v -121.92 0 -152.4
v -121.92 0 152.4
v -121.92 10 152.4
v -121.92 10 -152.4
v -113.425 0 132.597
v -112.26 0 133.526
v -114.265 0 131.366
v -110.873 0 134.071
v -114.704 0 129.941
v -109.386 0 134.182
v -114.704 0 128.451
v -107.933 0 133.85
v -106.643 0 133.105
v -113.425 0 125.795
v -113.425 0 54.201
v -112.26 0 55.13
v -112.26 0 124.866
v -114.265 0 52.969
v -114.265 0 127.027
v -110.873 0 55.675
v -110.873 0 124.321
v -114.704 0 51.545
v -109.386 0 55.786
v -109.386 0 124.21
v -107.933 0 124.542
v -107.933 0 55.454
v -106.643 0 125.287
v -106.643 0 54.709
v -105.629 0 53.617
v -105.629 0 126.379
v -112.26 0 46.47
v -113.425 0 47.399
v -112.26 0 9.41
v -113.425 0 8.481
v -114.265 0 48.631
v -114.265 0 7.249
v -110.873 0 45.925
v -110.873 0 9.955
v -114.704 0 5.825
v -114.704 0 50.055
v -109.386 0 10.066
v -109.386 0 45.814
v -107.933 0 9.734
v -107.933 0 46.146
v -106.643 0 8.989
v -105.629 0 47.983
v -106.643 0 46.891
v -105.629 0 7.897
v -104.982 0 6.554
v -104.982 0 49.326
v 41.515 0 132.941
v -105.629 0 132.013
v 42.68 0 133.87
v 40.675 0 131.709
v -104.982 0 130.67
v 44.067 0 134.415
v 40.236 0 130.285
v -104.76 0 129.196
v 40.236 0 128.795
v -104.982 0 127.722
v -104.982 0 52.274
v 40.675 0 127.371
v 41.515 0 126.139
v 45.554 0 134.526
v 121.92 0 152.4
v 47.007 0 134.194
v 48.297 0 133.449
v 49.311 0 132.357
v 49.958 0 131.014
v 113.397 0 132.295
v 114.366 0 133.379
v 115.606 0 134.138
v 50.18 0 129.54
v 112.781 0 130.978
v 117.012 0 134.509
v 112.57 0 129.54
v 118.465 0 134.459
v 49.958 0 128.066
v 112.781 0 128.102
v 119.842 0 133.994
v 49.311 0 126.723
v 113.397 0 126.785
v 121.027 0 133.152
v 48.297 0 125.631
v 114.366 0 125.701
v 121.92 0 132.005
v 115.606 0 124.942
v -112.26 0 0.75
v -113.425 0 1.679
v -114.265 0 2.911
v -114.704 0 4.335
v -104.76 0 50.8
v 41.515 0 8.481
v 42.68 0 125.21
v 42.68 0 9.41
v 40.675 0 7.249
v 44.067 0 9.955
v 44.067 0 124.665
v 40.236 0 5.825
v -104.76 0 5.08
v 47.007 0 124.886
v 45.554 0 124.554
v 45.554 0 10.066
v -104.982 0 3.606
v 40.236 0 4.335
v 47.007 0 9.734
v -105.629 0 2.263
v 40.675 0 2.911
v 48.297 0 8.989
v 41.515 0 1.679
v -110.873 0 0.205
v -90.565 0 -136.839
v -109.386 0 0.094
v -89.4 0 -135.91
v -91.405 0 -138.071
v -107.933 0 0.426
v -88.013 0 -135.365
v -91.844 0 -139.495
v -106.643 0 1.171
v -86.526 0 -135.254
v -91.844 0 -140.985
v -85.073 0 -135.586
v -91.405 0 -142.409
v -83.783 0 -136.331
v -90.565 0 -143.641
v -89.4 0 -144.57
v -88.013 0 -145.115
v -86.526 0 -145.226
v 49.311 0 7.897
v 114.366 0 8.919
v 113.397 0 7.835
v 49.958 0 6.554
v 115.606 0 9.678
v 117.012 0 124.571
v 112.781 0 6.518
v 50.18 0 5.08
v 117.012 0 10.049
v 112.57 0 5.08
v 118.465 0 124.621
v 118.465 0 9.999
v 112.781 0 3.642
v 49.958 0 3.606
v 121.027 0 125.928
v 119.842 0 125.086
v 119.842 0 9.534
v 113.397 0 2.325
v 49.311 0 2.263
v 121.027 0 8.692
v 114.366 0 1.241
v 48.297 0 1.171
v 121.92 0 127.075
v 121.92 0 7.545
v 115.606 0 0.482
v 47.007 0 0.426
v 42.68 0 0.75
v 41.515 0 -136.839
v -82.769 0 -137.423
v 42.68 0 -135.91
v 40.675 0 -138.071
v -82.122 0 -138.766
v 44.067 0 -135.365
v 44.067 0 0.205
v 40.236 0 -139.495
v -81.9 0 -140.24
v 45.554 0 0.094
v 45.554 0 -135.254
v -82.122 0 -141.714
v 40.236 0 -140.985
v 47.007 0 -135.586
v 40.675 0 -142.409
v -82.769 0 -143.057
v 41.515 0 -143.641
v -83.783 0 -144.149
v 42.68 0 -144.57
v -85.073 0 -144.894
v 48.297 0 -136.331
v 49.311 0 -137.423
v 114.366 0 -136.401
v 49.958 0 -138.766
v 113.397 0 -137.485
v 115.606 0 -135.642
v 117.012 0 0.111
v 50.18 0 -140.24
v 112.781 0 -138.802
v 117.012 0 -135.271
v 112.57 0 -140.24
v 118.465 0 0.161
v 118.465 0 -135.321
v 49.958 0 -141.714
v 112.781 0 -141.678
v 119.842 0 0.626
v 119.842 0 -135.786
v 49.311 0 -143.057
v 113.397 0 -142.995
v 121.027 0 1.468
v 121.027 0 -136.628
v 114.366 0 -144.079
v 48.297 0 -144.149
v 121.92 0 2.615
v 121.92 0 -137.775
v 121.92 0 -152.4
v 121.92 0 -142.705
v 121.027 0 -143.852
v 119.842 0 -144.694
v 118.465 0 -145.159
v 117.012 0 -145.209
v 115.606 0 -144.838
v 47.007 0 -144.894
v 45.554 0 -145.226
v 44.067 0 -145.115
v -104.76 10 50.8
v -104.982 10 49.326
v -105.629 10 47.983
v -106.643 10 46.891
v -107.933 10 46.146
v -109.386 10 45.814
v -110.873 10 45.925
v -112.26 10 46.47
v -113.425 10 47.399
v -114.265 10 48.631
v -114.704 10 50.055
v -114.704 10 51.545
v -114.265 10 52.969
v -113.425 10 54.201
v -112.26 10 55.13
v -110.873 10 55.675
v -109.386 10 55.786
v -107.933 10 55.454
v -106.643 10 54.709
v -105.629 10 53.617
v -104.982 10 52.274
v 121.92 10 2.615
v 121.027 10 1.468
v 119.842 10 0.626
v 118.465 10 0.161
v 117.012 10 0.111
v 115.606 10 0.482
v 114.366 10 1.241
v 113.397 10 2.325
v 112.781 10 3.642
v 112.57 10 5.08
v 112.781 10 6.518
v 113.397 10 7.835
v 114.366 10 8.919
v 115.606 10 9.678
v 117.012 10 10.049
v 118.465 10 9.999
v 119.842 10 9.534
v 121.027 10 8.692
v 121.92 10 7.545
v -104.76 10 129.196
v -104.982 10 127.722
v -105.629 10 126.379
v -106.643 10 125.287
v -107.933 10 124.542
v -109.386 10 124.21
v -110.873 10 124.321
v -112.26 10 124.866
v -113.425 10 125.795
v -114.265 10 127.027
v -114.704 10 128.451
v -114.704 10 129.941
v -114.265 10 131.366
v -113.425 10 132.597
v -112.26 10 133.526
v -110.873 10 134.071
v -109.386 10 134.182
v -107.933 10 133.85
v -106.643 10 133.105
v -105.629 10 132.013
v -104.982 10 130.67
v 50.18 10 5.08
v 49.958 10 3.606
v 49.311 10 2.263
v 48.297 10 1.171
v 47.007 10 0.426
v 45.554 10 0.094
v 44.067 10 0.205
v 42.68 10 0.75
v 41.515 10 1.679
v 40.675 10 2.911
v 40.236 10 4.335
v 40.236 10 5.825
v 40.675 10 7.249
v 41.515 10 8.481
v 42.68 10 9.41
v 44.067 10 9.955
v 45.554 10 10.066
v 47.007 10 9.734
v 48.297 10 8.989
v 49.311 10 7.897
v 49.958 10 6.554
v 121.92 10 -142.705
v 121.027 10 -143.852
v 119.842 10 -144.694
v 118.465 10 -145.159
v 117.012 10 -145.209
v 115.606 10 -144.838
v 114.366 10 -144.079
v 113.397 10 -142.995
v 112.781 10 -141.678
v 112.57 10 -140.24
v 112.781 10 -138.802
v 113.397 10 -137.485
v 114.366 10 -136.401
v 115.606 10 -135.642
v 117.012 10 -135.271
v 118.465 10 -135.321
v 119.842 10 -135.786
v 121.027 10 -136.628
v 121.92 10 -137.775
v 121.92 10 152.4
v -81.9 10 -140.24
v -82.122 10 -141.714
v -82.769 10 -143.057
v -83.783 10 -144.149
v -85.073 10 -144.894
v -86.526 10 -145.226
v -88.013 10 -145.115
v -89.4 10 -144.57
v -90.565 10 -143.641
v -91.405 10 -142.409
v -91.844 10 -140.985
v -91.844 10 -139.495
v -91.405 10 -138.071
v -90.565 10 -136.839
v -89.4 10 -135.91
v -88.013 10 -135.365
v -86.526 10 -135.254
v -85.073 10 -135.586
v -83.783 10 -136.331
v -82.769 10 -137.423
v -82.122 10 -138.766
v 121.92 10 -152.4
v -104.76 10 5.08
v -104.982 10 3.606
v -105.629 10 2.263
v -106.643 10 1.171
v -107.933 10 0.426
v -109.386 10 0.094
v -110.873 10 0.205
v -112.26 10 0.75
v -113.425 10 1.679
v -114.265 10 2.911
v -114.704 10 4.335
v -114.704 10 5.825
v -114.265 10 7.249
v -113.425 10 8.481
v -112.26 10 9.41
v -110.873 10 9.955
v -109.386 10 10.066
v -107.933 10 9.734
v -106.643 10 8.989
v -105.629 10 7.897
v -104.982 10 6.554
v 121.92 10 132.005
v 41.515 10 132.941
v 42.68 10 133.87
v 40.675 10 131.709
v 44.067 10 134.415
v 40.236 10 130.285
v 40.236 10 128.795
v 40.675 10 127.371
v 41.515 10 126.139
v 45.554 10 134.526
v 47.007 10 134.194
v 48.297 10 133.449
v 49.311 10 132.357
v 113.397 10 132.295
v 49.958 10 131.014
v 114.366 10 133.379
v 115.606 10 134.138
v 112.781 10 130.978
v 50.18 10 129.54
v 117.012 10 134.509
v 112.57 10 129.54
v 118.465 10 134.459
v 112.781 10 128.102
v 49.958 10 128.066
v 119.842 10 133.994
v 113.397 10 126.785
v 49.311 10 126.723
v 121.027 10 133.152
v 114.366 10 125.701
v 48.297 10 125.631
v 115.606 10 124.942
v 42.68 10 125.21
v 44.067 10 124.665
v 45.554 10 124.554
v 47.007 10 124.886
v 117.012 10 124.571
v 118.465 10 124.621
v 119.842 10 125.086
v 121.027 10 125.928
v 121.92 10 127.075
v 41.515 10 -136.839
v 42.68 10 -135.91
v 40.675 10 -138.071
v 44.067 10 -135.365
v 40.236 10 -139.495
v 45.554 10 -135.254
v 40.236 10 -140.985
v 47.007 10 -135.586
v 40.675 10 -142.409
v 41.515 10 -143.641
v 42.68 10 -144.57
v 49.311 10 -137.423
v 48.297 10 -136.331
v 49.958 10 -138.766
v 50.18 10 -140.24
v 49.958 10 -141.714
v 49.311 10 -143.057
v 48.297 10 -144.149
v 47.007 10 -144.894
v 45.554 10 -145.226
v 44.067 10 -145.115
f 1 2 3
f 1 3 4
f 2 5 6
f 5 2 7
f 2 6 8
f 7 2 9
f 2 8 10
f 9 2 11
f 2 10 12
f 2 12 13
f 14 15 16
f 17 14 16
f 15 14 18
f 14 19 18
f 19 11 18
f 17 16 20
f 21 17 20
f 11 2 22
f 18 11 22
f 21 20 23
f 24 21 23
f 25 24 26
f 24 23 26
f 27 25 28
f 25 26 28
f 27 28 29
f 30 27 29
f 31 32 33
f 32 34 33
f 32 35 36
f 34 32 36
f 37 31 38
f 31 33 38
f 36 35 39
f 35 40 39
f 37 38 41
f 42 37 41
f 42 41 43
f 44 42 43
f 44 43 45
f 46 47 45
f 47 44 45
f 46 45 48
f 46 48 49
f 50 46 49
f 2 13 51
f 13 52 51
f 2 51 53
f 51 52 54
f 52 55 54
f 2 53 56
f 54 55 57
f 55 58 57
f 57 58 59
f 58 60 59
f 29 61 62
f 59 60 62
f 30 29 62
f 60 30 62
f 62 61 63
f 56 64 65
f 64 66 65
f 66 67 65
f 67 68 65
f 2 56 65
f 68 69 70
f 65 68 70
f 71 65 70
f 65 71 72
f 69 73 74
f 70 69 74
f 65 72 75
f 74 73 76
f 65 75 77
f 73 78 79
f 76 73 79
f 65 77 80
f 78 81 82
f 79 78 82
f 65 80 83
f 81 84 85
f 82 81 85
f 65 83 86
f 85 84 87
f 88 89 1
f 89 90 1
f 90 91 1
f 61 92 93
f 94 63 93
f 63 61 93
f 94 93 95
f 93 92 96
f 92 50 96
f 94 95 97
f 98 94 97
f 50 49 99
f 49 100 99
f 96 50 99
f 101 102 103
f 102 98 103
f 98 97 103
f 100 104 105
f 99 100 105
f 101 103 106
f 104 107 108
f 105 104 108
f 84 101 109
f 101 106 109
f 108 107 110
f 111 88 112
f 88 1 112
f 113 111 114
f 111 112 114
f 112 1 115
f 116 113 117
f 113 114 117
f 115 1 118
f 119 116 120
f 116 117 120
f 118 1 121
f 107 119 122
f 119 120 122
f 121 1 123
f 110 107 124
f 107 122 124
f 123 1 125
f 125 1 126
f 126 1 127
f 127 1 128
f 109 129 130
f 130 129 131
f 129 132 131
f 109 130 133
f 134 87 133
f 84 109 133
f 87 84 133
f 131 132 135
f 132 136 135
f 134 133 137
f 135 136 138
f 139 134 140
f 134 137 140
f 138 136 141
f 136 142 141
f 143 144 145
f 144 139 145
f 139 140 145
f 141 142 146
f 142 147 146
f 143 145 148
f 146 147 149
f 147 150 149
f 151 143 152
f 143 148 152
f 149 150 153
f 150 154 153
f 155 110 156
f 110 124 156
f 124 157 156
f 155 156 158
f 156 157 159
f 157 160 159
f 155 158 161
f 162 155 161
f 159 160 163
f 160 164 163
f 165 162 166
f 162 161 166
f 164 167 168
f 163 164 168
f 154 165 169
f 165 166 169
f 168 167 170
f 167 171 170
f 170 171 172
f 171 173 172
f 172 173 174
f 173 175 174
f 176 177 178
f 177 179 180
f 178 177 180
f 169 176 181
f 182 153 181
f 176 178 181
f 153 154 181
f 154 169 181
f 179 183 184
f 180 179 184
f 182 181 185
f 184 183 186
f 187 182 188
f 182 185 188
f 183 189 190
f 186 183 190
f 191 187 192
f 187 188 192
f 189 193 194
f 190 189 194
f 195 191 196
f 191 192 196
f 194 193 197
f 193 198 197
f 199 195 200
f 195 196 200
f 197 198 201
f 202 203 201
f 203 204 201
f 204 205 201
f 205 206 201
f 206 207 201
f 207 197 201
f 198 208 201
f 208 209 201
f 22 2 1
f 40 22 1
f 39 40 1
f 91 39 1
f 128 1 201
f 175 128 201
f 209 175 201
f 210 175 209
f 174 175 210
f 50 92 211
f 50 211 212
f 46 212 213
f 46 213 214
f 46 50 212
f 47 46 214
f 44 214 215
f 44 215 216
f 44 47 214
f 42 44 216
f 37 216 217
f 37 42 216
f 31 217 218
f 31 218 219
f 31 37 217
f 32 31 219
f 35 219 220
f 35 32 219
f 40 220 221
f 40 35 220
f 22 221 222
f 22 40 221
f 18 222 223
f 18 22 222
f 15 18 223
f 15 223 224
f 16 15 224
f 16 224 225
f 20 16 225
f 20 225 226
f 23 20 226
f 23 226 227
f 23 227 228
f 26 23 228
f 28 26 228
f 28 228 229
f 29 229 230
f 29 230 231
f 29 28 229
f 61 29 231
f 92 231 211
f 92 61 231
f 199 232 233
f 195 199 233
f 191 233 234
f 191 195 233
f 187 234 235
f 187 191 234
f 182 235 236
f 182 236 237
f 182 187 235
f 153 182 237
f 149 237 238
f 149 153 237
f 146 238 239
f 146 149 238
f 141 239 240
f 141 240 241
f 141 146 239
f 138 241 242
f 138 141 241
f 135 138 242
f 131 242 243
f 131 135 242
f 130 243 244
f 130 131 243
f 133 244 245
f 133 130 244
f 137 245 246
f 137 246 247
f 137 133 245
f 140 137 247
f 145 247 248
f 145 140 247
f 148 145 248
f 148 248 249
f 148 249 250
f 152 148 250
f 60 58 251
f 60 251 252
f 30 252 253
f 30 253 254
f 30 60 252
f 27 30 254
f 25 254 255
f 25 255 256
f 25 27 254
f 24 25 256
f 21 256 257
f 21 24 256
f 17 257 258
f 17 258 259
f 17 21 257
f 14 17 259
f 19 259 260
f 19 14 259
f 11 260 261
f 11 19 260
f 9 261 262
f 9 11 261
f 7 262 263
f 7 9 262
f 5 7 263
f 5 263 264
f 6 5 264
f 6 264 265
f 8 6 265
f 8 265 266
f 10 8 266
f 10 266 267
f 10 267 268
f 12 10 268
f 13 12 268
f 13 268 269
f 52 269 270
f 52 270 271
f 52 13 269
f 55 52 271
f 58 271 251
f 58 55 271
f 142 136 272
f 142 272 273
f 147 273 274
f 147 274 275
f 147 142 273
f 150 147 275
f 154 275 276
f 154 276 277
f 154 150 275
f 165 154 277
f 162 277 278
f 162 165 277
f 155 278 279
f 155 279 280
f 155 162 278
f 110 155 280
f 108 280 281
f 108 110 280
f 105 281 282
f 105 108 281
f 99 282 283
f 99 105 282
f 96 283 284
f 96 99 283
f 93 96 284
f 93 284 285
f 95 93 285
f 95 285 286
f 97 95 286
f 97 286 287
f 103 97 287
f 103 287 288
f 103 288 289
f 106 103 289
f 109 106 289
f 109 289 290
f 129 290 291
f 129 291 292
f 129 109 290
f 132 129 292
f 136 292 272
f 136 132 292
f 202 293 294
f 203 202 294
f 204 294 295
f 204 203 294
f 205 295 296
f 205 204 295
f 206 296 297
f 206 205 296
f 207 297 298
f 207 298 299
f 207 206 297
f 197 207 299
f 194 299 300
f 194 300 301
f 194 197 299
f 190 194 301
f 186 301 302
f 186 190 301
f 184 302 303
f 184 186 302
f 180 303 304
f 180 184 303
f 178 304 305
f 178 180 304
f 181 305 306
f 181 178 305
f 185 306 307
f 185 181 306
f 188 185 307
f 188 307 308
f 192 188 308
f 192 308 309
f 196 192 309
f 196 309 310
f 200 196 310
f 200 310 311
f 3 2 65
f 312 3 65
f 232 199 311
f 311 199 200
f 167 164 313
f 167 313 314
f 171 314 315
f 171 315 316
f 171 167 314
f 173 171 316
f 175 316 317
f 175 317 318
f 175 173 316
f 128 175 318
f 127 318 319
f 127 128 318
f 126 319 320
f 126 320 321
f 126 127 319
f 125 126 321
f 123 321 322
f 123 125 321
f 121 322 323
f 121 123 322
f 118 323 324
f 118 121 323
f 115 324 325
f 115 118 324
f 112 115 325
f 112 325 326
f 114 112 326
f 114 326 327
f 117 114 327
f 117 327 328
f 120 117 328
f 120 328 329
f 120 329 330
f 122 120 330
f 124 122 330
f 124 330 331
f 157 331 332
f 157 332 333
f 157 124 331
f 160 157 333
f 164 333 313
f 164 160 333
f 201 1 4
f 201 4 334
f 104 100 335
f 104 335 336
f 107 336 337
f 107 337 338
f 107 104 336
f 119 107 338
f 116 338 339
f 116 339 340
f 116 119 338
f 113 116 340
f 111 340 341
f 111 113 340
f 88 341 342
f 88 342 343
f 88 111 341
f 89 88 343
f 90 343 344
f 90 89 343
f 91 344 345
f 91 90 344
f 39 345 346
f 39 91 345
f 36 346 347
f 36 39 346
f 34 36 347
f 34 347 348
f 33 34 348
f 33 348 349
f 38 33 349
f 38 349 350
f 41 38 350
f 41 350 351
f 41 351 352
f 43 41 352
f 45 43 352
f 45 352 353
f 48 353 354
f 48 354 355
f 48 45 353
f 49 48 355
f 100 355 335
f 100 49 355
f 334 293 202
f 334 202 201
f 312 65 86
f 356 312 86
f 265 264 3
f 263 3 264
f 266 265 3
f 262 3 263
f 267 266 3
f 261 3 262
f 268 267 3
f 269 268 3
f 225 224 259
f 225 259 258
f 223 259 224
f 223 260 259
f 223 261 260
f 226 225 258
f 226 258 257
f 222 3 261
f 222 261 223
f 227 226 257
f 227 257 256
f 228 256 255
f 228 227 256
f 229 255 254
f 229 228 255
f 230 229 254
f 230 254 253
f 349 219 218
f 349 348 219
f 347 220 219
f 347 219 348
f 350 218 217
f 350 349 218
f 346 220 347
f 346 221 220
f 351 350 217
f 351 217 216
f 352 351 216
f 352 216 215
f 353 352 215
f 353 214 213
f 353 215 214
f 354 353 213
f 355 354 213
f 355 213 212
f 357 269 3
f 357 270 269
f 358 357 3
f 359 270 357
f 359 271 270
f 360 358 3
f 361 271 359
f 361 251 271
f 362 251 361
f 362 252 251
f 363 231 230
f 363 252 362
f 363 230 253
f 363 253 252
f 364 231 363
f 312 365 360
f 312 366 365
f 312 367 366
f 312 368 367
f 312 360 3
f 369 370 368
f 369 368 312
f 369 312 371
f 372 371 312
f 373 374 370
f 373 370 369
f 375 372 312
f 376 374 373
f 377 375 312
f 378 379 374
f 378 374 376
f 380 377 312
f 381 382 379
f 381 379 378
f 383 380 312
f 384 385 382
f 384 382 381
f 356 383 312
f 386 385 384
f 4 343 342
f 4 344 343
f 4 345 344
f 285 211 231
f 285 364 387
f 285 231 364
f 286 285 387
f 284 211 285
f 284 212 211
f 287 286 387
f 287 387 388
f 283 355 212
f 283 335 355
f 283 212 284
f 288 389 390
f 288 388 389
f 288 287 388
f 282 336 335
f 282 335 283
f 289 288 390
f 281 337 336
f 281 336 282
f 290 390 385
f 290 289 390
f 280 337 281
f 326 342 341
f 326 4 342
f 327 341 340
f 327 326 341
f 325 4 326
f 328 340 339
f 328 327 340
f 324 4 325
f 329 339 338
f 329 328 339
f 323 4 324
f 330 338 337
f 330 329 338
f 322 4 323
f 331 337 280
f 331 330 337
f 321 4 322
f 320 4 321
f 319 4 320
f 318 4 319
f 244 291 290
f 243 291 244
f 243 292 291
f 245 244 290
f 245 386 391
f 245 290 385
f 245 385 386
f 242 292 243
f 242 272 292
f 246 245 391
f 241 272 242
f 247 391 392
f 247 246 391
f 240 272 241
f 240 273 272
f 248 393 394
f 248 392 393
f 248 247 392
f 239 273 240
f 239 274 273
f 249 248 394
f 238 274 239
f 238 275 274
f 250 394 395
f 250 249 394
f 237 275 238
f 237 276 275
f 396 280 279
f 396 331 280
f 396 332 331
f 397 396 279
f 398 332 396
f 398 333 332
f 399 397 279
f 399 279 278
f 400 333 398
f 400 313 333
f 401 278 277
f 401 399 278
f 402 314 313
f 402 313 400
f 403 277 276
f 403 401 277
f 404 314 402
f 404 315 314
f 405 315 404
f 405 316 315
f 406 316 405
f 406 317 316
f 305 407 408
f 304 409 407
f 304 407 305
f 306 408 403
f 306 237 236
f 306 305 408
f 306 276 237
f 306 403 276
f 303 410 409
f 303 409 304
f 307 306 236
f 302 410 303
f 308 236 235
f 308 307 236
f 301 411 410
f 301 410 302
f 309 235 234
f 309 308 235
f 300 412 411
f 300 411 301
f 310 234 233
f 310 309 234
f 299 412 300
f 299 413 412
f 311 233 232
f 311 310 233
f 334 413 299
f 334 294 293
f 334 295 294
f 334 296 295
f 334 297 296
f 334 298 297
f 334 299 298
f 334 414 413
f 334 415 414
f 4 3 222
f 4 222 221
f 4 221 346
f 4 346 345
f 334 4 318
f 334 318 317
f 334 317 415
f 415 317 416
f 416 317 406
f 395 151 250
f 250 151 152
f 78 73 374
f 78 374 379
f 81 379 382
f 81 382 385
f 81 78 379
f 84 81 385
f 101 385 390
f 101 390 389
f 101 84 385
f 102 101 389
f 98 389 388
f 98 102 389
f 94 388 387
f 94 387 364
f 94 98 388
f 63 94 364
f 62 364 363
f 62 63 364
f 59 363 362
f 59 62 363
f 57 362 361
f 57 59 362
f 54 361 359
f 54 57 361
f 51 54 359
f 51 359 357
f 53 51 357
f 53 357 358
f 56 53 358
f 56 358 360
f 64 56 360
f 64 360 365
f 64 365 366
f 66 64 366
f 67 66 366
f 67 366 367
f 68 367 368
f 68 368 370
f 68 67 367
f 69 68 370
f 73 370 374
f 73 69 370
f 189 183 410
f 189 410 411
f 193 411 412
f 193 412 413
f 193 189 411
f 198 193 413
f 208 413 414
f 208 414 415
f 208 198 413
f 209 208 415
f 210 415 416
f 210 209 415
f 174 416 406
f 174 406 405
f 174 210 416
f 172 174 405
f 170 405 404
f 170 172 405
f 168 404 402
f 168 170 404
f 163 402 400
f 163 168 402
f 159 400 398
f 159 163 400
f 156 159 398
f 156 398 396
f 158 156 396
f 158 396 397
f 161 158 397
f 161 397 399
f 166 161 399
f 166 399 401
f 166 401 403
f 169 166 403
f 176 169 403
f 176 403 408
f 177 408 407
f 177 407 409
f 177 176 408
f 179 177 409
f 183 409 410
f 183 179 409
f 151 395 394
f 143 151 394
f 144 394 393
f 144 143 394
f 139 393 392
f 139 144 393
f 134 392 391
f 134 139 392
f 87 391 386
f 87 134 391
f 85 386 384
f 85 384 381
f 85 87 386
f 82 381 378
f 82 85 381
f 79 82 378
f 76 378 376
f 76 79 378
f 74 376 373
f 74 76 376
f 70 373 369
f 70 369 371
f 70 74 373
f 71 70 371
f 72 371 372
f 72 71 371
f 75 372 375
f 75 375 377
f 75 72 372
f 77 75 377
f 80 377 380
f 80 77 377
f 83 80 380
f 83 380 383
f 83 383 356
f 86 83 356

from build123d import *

# Parameters (mm, degrees)
SKETCH2_W           = 243.84
SKETCH2_H           = 304.8
BOSS_EXTRUDE1_DEPTH = 10
SKETCH1_R           = 5
CUT_EXTRUDE2_DEPTH  = 10


with BuildPart() as part:
    # Sketch2 → Boss-Extrude1 (new body)
    with BuildSketch(Plane(origin=(0, 0, 0), x_dir=(1, 0, 0), z_dir=(0, 1, 0))):
        Rectangle(SKETCH2_W, SKETCH2_H)
    extrude(amount=BOSS_EXTRUDE1_DEPTH)

    # Sketch1 → Cut-Extrude2 (cut)
    with BuildSketch(Plane(origin=(0, 0, 0), x_dir=(1, 0, 0), z_dir=(0, 1, 0))):
        with Locations((-86.9, 140.24)):
            Circle(SKETCH1_R)
        with Locations((45.18, 140.24)):
            Circle(SKETCH1_R)
        with Locations((117.57, 140.24)):
            Circle(SKETCH1_R)
        with Locations((117.57, -5.08)):
            Circle(SKETCH1_R)
        with Locations((45.18, -5.08)):
            Circle(SKETCH1_R)
        with Locations((-109.76, -5.08)):
            Circle(SKETCH1_R)
        with Locations((-109.76, -50.8)):
            Circle(SKETCH1_R)
        with Locations((-109.76, -129.196094703)):
            Circle(SKETCH1_R)
        with Locations((45.18, -129.54)):
            Circle(SKETCH1_R)
        with Locations((117.57, -129.54)):
            Circle(SKETCH1_R)
    extrude(amount=CUT_EXTRUDE2_DEPTH, mode=Mode.SUBTRACT)


solid = part.part
